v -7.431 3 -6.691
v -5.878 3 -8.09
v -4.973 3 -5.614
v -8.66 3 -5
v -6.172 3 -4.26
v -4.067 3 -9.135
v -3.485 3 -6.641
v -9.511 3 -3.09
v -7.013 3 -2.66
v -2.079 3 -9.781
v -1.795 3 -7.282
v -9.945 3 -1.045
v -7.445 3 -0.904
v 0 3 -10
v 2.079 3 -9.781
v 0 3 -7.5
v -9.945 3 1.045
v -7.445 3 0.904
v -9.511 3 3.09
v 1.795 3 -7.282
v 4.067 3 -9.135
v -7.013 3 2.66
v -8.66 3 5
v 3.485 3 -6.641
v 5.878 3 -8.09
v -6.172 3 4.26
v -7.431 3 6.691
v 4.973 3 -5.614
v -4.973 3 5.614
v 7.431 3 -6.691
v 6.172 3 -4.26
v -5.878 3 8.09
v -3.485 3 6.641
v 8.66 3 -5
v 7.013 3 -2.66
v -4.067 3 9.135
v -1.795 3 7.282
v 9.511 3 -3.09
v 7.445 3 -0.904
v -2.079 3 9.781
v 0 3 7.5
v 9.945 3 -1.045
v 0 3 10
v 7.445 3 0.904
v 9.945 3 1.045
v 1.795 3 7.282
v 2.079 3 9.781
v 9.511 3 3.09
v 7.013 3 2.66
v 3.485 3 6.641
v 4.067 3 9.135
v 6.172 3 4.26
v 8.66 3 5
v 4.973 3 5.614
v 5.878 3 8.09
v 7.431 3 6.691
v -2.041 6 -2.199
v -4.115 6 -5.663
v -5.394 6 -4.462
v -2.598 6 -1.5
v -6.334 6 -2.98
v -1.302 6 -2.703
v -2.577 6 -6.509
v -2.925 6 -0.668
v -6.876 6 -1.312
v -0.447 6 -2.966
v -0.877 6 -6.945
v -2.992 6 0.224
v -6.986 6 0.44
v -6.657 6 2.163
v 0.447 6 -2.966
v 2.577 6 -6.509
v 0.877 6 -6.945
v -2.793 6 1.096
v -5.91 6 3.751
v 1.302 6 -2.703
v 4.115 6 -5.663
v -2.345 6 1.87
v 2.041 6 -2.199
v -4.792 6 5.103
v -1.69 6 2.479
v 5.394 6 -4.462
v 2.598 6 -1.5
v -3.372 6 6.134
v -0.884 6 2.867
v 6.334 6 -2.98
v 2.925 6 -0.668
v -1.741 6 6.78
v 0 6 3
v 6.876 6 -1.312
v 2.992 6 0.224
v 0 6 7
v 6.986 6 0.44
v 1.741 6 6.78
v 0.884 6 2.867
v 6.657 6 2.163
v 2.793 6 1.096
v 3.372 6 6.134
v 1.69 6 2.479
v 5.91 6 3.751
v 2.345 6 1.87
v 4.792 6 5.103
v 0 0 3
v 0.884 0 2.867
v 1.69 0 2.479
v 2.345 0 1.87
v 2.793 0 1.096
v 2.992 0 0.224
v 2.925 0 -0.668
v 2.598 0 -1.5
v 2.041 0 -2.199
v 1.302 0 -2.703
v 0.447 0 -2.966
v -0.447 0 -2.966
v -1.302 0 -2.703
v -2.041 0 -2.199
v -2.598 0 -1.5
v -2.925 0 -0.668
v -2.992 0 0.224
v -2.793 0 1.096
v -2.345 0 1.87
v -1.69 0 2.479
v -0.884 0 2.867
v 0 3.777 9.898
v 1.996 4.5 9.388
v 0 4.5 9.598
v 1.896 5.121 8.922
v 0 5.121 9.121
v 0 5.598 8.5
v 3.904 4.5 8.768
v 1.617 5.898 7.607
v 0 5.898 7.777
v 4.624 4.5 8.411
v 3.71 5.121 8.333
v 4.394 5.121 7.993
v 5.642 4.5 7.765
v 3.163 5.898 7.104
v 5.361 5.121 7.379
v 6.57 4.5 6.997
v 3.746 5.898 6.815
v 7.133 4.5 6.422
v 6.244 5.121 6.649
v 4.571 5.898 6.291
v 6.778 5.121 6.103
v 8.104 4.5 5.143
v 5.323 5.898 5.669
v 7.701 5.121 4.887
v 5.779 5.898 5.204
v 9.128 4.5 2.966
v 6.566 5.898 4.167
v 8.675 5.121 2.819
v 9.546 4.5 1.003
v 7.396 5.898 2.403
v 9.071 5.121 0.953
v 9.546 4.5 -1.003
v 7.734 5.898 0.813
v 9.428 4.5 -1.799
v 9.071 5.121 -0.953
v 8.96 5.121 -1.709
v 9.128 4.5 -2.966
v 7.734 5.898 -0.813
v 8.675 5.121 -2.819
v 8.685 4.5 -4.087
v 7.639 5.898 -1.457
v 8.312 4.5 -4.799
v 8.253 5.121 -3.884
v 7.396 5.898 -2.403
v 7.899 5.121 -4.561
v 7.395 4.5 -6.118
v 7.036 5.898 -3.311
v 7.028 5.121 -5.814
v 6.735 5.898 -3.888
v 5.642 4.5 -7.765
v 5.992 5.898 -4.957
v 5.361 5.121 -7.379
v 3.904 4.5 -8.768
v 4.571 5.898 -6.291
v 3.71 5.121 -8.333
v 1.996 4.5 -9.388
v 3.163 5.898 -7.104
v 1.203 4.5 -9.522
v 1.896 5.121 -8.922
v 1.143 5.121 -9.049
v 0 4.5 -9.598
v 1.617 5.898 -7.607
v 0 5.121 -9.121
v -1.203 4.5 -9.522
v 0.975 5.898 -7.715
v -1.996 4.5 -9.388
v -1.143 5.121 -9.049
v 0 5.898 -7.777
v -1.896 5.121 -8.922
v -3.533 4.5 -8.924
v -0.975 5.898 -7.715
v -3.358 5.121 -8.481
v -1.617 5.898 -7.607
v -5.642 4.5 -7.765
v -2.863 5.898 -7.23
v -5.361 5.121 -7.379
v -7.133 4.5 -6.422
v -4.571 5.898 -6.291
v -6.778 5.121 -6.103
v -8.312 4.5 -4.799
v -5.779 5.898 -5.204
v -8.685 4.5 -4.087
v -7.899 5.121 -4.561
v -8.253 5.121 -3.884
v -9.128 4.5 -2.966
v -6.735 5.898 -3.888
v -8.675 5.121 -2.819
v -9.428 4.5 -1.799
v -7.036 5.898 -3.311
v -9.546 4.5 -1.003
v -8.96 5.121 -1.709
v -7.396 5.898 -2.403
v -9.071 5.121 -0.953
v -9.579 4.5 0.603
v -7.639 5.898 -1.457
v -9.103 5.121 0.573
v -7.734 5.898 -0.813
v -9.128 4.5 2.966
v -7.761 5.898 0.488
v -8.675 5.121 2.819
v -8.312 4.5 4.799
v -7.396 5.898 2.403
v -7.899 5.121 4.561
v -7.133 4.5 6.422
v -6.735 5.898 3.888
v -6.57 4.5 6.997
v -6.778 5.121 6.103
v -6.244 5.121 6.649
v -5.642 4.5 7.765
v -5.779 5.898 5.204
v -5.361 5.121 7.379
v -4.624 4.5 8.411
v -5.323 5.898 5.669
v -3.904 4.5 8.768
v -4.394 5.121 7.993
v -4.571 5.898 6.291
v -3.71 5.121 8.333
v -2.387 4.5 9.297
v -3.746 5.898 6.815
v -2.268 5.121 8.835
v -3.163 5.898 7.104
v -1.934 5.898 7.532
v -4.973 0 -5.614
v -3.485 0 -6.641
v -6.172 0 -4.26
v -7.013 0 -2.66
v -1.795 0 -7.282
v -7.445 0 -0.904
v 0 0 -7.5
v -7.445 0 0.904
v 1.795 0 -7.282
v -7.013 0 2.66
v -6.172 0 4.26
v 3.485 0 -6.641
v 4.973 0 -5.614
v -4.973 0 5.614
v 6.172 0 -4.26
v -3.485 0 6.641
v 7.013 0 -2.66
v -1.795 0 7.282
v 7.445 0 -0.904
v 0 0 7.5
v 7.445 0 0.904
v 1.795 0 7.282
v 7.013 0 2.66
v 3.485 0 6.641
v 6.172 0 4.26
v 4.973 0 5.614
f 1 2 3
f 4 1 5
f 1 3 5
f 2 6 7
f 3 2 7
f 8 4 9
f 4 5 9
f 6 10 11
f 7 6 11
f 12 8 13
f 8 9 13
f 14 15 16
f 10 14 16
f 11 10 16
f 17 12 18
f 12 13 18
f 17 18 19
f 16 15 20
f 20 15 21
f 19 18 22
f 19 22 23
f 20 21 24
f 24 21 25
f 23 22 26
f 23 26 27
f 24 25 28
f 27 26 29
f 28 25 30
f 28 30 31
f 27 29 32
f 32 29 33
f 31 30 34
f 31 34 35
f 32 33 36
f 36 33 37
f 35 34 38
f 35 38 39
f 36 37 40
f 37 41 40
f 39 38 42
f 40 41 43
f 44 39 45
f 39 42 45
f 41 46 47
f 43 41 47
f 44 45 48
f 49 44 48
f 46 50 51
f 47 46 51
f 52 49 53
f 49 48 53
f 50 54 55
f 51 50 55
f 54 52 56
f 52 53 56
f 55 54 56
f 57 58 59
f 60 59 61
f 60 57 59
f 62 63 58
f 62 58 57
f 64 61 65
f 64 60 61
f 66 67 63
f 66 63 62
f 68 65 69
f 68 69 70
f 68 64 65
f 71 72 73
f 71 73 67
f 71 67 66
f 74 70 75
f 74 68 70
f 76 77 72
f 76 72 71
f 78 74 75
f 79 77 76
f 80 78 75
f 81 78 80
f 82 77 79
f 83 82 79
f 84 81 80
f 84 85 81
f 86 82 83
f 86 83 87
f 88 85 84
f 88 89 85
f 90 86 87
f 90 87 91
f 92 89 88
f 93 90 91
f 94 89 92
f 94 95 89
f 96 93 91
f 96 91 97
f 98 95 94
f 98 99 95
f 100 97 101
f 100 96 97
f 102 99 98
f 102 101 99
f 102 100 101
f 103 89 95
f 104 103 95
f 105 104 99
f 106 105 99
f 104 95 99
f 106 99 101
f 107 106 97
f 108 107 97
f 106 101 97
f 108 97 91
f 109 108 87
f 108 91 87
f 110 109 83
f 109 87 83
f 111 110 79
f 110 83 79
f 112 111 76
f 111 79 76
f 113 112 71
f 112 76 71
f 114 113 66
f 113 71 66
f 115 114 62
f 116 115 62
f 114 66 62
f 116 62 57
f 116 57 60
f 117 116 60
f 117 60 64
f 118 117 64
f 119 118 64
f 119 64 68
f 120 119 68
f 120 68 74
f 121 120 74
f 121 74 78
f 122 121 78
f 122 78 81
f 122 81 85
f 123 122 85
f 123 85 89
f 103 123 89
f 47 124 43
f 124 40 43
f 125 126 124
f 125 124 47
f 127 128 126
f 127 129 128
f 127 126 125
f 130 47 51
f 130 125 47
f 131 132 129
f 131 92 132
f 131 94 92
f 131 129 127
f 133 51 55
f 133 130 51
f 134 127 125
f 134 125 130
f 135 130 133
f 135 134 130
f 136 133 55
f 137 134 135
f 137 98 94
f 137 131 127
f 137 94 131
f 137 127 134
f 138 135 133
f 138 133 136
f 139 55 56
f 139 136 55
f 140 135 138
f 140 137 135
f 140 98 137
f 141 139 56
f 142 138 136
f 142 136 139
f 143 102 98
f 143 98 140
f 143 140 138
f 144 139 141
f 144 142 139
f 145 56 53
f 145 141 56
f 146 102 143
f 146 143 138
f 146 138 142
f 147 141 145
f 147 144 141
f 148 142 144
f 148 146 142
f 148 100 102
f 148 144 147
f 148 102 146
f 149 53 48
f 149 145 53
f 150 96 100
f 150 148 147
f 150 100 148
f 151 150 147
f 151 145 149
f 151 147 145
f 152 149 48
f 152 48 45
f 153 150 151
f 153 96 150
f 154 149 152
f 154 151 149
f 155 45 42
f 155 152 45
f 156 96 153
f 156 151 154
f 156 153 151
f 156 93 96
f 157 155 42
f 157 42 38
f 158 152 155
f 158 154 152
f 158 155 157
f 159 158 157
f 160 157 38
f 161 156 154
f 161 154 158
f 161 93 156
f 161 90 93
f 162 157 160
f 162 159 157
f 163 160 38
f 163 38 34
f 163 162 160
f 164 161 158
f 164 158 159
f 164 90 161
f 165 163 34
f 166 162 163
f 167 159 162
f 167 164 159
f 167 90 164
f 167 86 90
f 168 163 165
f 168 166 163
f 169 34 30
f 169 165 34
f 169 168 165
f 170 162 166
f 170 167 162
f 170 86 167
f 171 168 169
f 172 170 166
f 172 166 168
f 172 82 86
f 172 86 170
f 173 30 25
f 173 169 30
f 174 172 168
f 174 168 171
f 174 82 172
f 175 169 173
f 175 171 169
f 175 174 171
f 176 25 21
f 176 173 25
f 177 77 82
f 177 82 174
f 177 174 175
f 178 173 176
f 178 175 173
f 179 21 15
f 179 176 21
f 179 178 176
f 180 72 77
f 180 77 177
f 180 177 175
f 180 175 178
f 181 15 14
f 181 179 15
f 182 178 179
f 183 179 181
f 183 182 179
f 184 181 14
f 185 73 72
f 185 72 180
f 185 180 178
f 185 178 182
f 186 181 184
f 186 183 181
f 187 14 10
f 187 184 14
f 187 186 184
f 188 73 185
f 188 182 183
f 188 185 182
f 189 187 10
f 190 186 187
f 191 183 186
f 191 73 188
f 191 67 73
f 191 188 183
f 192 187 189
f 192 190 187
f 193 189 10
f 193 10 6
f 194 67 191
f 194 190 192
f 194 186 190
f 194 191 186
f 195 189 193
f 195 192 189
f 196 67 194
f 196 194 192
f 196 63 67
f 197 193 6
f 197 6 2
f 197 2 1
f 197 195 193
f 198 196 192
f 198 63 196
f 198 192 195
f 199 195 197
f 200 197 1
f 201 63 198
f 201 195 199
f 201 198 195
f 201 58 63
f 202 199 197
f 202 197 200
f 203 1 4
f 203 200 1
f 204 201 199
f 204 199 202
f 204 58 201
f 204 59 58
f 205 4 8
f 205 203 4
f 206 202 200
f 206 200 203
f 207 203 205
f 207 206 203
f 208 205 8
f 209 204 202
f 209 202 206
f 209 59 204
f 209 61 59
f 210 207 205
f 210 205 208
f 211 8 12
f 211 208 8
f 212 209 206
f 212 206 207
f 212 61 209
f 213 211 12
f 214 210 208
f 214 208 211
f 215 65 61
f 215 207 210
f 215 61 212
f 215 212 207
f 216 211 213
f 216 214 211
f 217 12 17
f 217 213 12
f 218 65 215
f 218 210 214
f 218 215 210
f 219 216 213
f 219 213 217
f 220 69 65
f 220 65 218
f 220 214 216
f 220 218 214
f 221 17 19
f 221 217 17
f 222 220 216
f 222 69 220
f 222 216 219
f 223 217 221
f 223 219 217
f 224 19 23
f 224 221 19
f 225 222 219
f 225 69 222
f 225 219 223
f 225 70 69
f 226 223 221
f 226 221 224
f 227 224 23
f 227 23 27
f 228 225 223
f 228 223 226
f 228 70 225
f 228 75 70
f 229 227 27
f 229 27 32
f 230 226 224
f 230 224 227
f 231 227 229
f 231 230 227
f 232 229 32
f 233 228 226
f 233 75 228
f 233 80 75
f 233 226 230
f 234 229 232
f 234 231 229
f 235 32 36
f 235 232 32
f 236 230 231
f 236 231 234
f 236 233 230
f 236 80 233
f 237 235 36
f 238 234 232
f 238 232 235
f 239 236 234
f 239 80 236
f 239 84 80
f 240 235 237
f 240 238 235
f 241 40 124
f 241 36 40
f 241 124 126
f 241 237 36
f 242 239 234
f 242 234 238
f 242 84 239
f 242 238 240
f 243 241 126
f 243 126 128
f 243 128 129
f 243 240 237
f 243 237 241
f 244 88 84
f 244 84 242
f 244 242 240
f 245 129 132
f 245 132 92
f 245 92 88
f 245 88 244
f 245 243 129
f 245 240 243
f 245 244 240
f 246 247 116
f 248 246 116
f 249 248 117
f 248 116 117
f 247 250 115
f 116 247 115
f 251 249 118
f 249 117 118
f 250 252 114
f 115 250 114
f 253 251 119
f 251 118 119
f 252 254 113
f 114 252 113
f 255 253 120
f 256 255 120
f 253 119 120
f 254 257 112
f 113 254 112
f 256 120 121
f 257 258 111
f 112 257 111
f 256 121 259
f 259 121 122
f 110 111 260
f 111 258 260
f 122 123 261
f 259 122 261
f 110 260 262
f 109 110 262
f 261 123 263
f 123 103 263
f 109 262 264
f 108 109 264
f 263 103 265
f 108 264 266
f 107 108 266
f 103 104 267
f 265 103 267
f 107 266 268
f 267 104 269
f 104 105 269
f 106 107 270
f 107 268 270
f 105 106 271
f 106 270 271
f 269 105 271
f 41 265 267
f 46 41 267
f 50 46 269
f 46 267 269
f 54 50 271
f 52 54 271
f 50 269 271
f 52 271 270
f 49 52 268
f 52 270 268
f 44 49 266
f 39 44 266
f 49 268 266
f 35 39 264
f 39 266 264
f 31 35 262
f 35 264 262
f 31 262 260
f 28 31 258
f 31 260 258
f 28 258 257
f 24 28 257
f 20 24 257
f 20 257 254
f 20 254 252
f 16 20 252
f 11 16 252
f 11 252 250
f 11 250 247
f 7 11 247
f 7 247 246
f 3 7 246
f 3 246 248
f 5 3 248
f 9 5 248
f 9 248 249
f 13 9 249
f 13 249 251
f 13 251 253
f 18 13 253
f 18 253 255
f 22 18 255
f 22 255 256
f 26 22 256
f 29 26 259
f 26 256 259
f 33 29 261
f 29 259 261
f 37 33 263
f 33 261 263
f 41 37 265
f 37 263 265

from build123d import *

# Parameters (mm, degrees)
SKETCH1_R           = 7.5
BOSS_EXTRUDE1_DEPTH = 6
BOSS_EXTRUDE2_START = -3
SKETCH2_R           = 10
SKETCH2_R_2         = 7.5
BOSS_EXTRUDE2_DEPTH = 3
FILLET1_R           = 3
SKETCH3_R           = 3
CUT_EXTRUDE1_DEPTH  = 16.362291496


with BuildPart() as part:
    # Sketch1 → Boss-Extrude1 (new body)
    with BuildSketch(Plane(origin=(0, 0, 0), x_dir=(1, 0, 0), z_dir=(0, 1, 0))):
        with Locations(Location((0, 0, 0), (0, 0, 270))):
            Circle(SKETCH1_R)
    extrude(amount=BOSS_EXTRUDE1_DEPTH)

    # Sketch2 → Boss-Extrude2 (add)
    with BuildSketch(Plane(origin=(0, 6, 0), x_dir=(1, 0, 0), z_dir=(0, 1, 0)).offset(BOSS_EXTRUDE2_START)):
        with Locations(Location((0, 0, 0), (0, 0, 270))):
            Circle(SKETCH2_R)
        with Locations(Location((0, 0, 0), (0, 0, 270))):
            Circle(SKETCH2_R_2, mode=Mode.SUBTRACT)
    extrude(amount=BOSS_EXTRUDE2_DEPTH)

    # Fillet1
    fillet1_edges = [part.edges().sort_by_distance(p)[0] for p in [
        (0, 6, -10),
    ]]
    fillet(fillet1_edges, radius=FILLET1_R - 0.0001)  # a hair under: the kernel refuses the full size

    # Sketch3 → Cut-Extrude1 (cut, through all)
    with BuildSketch(Plane(origin=(0, 6, 0), x_dir=(1, 0, 0), z_dir=(0, 1, 0))):
        with Locations(Location((0, 0, 0), (0, 0, 270))):
            Circle(SKETCH3_R)
    extrude(amount=-CUT_EXTRUDE1_DEPTH, mode=Mode.SUBTRACT)


solid = part.part
